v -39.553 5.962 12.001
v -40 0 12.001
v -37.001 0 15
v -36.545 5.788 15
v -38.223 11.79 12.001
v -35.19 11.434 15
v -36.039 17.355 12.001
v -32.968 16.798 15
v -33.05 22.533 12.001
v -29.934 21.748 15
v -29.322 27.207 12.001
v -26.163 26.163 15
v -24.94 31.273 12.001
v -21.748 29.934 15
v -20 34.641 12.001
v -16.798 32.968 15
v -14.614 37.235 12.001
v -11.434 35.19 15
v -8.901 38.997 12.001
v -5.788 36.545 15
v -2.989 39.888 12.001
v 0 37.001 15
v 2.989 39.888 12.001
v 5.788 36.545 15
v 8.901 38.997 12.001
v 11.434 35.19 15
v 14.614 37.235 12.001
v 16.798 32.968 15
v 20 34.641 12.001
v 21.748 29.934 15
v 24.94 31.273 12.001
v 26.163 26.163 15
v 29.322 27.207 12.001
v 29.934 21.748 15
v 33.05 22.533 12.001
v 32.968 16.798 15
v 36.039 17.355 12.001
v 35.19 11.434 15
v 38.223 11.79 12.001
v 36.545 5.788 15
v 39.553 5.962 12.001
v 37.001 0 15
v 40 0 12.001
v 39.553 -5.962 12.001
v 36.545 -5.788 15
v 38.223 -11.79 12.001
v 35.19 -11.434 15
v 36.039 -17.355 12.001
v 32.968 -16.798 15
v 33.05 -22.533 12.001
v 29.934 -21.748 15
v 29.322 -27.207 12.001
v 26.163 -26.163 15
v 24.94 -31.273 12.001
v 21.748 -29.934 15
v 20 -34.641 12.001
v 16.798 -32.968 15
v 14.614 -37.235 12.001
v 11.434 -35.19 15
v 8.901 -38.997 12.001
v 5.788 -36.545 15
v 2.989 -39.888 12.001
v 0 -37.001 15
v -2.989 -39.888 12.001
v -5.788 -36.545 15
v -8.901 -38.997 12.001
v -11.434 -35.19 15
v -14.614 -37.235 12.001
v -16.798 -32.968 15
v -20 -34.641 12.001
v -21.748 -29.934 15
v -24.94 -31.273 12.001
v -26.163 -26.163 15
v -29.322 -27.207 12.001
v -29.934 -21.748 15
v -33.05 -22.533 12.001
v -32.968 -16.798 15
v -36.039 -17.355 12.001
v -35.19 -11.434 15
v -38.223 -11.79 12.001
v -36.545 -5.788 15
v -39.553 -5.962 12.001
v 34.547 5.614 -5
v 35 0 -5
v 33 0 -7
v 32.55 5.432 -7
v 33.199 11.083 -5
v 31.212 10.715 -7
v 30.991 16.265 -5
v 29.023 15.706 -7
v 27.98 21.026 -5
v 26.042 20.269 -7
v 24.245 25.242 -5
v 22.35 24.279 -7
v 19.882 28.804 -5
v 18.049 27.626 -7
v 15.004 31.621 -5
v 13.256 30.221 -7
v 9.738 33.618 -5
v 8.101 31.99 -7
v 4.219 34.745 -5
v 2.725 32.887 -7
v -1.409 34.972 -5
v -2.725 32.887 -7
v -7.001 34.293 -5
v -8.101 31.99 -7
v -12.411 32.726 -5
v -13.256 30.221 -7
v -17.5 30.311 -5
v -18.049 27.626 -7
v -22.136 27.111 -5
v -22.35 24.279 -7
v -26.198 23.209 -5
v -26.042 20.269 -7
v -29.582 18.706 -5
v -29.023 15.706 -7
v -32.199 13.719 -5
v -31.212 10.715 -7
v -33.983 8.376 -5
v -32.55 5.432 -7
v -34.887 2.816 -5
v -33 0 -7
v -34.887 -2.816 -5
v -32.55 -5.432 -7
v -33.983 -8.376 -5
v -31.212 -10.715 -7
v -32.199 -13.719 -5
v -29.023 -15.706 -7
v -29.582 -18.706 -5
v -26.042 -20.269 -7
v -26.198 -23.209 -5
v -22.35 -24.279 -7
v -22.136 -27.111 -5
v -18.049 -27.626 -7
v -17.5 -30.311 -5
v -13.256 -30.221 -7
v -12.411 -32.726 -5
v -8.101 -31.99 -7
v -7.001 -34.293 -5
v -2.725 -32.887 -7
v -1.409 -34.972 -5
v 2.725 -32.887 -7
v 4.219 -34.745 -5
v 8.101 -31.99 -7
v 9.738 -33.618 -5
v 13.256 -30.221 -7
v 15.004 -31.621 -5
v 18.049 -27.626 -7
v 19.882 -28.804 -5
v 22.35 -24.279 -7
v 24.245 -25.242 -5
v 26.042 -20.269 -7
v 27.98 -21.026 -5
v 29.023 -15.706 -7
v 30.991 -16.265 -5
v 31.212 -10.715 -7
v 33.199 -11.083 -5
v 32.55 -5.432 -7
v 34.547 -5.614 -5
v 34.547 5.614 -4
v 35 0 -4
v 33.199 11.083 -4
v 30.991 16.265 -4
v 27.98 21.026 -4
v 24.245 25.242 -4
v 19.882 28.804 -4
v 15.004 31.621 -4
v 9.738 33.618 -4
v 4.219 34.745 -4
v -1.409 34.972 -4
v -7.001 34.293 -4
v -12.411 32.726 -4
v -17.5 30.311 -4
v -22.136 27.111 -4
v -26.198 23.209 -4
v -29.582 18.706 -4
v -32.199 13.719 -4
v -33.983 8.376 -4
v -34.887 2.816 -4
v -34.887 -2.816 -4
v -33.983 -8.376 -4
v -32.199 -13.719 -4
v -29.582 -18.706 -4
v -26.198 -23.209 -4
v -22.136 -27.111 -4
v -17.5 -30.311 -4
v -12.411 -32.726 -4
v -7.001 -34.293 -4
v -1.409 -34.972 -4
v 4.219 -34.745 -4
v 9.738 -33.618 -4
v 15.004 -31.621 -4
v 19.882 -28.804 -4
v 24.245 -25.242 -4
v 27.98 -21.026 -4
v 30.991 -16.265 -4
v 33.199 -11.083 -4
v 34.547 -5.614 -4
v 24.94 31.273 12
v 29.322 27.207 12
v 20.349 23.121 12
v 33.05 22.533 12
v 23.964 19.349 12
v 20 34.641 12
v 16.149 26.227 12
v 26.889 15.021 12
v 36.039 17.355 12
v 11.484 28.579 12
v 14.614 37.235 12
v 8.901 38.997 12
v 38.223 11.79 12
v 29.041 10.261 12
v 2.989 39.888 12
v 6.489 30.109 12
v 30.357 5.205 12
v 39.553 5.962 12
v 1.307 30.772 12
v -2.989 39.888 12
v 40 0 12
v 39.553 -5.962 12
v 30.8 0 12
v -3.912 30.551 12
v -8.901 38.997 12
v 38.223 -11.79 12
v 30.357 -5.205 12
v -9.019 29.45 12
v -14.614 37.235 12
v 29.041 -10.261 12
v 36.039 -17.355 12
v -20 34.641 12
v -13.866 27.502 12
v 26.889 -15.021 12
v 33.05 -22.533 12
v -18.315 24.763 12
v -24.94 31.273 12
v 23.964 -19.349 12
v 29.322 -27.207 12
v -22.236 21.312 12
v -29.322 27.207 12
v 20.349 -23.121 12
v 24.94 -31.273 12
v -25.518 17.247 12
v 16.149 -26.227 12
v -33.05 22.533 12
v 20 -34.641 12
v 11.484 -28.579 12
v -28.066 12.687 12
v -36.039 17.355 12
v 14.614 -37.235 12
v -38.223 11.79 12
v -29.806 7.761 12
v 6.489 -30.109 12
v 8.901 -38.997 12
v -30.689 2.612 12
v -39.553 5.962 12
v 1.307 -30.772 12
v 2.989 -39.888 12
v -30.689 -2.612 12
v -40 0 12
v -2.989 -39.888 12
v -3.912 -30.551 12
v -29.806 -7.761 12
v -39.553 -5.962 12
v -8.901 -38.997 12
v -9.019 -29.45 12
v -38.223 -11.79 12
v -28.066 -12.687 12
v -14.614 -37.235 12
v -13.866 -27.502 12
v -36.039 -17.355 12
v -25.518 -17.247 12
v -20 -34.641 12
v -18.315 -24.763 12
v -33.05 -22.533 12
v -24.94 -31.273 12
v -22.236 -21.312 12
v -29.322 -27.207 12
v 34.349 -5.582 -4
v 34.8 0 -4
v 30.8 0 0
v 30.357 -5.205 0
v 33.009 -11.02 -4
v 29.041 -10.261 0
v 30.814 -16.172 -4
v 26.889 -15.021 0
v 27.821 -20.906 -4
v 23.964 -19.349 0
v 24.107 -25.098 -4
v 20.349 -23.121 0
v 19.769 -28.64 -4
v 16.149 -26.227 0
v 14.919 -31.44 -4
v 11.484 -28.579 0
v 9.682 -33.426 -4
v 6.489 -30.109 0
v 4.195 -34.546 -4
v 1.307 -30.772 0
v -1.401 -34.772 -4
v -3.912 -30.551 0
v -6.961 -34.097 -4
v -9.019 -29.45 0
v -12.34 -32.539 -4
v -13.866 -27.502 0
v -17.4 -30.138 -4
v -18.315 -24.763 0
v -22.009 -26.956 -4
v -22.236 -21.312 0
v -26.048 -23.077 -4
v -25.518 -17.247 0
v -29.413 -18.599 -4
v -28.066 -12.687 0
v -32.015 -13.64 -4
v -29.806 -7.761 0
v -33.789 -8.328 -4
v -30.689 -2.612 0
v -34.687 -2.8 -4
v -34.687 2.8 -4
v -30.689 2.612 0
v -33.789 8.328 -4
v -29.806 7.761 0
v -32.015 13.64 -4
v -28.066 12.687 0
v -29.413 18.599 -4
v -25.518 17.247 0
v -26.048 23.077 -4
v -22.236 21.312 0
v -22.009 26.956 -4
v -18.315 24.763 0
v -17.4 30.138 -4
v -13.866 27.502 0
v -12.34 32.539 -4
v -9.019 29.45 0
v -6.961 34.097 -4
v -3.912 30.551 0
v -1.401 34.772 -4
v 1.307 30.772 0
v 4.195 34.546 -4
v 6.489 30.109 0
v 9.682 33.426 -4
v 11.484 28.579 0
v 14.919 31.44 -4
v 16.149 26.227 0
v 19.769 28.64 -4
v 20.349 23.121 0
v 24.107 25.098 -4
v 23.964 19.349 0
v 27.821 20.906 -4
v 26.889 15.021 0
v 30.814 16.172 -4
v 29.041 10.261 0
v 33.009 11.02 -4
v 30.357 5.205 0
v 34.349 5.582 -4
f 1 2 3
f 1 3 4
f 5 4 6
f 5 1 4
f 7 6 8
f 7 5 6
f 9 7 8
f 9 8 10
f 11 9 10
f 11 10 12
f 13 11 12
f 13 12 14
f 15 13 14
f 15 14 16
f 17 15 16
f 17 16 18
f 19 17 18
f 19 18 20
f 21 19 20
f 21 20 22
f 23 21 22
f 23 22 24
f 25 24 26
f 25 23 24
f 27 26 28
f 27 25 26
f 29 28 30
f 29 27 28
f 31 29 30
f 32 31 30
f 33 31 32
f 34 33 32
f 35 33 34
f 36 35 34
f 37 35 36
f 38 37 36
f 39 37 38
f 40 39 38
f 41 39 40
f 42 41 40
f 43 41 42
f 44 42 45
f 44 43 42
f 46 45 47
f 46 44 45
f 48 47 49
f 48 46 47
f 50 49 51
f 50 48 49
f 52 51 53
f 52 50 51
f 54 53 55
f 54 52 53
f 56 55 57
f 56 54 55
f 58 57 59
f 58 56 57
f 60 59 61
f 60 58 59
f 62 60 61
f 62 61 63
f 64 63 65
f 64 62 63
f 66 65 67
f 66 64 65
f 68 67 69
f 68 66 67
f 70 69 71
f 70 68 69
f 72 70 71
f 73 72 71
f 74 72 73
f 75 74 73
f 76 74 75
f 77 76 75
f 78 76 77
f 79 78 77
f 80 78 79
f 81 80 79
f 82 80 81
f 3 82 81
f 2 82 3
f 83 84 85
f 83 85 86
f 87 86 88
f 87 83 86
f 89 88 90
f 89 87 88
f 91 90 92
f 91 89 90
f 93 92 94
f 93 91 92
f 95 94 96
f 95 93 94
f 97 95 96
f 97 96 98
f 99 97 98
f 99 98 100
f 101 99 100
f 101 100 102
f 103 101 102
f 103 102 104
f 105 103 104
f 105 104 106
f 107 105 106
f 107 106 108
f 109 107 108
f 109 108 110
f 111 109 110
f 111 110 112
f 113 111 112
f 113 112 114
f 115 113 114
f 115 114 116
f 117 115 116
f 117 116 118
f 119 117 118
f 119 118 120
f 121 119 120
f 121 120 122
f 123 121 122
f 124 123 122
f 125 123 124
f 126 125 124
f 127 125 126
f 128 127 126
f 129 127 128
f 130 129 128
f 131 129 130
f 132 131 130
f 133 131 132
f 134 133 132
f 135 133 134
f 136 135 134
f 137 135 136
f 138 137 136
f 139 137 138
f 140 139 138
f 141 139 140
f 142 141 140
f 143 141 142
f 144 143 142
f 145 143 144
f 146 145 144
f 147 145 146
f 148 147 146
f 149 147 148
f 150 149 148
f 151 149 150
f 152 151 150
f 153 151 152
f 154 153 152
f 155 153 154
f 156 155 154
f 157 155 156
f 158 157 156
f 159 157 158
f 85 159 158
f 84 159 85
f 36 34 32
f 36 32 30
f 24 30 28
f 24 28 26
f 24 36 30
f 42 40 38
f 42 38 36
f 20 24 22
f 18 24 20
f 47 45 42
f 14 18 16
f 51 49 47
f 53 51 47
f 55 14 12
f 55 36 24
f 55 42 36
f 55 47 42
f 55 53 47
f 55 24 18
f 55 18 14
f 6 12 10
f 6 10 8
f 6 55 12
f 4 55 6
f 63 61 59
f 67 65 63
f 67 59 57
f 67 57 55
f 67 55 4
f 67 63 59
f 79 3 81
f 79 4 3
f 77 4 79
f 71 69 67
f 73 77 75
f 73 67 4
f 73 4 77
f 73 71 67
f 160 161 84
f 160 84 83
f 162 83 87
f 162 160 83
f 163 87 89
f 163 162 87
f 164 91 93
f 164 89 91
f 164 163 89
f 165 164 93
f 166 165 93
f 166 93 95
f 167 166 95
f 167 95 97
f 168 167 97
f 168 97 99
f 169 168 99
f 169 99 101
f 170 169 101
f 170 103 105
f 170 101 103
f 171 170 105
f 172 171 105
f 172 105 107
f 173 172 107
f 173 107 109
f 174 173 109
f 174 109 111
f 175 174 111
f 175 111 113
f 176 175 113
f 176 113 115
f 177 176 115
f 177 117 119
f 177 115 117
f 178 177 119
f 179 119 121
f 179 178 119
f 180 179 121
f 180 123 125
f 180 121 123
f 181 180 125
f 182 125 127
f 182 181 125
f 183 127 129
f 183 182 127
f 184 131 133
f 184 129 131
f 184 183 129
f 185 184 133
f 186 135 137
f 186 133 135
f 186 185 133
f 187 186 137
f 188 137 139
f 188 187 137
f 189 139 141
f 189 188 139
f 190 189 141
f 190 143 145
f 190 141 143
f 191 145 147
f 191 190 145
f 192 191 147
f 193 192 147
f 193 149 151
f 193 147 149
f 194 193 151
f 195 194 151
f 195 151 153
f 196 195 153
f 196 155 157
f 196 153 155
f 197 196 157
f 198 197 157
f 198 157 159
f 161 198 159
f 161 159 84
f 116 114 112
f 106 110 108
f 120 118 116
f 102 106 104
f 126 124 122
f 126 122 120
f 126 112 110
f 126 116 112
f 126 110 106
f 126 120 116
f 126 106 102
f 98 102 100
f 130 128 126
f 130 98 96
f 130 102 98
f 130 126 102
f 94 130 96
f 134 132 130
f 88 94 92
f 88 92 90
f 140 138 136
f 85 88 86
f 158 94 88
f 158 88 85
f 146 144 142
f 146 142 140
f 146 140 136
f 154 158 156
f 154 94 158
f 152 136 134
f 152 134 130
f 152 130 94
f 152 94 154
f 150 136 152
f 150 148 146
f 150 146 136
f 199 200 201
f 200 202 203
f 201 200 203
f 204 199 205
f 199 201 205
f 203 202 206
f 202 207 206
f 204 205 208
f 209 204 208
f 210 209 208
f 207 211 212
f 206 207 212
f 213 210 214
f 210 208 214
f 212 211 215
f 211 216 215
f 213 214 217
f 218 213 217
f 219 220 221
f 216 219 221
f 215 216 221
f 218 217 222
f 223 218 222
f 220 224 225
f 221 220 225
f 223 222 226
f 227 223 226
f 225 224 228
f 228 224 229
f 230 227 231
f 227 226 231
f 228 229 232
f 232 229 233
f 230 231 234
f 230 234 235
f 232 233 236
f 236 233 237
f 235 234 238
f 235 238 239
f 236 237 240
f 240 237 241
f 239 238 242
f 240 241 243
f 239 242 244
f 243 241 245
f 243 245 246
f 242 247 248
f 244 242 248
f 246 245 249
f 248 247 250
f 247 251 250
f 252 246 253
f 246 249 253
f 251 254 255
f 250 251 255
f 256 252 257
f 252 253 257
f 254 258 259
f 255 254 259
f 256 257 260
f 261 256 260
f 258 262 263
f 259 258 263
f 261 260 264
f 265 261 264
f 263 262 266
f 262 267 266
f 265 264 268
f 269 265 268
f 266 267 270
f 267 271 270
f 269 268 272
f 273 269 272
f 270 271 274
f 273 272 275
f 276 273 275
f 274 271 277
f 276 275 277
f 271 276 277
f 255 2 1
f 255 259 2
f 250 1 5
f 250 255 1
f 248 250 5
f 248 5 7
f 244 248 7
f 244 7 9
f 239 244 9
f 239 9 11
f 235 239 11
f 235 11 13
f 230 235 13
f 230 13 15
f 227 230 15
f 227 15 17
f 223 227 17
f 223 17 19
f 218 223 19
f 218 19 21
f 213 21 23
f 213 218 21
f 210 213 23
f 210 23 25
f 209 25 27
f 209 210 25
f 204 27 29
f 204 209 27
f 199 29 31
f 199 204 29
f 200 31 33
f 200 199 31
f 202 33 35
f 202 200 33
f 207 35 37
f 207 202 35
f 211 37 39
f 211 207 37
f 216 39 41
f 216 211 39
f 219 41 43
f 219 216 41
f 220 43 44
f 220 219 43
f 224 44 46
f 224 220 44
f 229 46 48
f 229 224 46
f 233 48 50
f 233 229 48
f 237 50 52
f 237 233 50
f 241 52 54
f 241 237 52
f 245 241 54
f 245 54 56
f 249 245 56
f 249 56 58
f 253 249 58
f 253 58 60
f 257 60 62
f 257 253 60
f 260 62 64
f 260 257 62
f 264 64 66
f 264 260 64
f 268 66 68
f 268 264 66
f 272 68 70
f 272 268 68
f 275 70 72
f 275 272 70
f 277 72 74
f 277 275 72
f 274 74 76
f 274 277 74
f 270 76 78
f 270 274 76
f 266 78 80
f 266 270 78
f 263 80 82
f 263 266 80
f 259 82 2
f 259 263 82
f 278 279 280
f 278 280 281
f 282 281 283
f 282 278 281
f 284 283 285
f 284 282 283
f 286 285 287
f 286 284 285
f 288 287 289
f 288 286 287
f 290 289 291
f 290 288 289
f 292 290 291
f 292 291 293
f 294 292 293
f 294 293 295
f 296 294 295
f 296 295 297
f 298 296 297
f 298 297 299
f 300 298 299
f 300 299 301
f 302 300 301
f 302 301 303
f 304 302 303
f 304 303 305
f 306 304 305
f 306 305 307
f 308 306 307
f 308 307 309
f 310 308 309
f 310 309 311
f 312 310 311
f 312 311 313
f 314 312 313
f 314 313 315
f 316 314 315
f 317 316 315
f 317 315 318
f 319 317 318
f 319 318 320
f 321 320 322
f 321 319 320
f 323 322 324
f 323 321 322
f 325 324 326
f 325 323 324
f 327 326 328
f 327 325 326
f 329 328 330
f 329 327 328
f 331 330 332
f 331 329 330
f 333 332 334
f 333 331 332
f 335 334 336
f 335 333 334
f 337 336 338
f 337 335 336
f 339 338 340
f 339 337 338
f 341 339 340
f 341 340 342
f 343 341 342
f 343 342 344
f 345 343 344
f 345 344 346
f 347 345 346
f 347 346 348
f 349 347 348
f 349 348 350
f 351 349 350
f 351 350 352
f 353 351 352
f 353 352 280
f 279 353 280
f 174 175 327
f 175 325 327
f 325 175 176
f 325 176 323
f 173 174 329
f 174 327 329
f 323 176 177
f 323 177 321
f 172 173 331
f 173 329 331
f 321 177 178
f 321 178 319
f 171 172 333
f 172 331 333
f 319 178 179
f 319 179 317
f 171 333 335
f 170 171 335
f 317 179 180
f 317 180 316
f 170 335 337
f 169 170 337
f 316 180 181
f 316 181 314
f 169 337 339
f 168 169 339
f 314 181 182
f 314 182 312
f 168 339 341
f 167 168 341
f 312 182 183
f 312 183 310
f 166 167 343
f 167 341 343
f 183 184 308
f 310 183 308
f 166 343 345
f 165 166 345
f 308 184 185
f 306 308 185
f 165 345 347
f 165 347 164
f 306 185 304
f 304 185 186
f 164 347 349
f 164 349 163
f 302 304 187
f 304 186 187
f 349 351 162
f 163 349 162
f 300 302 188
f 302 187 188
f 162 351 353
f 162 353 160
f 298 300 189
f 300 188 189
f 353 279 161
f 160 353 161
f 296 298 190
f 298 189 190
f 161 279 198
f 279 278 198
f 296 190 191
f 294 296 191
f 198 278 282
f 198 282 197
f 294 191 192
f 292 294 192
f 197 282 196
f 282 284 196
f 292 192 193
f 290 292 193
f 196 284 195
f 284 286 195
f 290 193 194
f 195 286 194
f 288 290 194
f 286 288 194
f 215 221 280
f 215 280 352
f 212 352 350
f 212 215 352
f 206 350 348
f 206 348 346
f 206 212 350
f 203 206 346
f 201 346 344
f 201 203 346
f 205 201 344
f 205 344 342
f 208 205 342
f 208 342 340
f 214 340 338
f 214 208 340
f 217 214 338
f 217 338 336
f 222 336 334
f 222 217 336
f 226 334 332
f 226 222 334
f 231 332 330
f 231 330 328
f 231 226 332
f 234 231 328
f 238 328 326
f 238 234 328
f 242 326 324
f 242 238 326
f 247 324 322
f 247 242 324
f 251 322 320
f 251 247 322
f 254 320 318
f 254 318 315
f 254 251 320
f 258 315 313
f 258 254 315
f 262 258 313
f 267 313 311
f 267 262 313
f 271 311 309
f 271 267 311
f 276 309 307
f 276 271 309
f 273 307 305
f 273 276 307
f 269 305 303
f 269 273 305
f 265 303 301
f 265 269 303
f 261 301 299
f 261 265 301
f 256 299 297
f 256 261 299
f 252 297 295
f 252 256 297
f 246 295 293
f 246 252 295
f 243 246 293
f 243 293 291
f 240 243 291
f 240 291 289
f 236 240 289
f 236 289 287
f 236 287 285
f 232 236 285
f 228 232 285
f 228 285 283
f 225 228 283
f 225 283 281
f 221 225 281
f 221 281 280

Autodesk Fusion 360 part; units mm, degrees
sketch "Skizze1" plane through (0, 0, 0) normal (0, 0, 1) x (1, 0, 0)
  circle A0 centre (0, 0) radius 30.8
  dimension "d1" = 61.6
extrude "Extrusion1" add sketch "Skizze1" along normal blind 12
sketch "Skizze2" plane through (0, 0, 12) normal (0, 0, 1) x (-1, 0, 0)
  circle A0 centre (0, 0) radius 30.8
  circle A1 centre (0, 0) radius 40
  dimension "d4" = 80
extrude "Extrusion2" add sketch "Skizze2" along normal blind 3 contours A0 | A1
extrude "Extrusion4" add 1 faces at (6.9618, -9.4552, 0) along direction (0, 0, -1) blind 4
sketch "Skizze4" plane through (0, 0, -4) normal (0, 0, -1) x (1, 0, 0)
  circle A0 centre (0, 0) radius 30.8
  circle A1 centre (0, 0) radius 35
  dimension "d14" = 70
extrude "Extrusion5" add sketch "Skizze4" along normal blind 3 contours A0 | A1
chamfer "Fase3" distance 2 angle 45 1 edges at (-32.6315, 12.6565, -7)
chamfer "Fase5" distance 3 angle 45 1 edges at (37.2931, 14.4646, 15)
sketch "Skizze5" plane through (0, 0, 15) normal (0, 0, 1) x (-1, 0, 0)
  circle A0 centre (0, 0) radius 37
  circle A1 centre (0, 0) radius 27
  dimension "d20" = 54
chamfer "Fase7" distance 4 angle 45 1 edges at (-28.7157, 11.1378, -4)
